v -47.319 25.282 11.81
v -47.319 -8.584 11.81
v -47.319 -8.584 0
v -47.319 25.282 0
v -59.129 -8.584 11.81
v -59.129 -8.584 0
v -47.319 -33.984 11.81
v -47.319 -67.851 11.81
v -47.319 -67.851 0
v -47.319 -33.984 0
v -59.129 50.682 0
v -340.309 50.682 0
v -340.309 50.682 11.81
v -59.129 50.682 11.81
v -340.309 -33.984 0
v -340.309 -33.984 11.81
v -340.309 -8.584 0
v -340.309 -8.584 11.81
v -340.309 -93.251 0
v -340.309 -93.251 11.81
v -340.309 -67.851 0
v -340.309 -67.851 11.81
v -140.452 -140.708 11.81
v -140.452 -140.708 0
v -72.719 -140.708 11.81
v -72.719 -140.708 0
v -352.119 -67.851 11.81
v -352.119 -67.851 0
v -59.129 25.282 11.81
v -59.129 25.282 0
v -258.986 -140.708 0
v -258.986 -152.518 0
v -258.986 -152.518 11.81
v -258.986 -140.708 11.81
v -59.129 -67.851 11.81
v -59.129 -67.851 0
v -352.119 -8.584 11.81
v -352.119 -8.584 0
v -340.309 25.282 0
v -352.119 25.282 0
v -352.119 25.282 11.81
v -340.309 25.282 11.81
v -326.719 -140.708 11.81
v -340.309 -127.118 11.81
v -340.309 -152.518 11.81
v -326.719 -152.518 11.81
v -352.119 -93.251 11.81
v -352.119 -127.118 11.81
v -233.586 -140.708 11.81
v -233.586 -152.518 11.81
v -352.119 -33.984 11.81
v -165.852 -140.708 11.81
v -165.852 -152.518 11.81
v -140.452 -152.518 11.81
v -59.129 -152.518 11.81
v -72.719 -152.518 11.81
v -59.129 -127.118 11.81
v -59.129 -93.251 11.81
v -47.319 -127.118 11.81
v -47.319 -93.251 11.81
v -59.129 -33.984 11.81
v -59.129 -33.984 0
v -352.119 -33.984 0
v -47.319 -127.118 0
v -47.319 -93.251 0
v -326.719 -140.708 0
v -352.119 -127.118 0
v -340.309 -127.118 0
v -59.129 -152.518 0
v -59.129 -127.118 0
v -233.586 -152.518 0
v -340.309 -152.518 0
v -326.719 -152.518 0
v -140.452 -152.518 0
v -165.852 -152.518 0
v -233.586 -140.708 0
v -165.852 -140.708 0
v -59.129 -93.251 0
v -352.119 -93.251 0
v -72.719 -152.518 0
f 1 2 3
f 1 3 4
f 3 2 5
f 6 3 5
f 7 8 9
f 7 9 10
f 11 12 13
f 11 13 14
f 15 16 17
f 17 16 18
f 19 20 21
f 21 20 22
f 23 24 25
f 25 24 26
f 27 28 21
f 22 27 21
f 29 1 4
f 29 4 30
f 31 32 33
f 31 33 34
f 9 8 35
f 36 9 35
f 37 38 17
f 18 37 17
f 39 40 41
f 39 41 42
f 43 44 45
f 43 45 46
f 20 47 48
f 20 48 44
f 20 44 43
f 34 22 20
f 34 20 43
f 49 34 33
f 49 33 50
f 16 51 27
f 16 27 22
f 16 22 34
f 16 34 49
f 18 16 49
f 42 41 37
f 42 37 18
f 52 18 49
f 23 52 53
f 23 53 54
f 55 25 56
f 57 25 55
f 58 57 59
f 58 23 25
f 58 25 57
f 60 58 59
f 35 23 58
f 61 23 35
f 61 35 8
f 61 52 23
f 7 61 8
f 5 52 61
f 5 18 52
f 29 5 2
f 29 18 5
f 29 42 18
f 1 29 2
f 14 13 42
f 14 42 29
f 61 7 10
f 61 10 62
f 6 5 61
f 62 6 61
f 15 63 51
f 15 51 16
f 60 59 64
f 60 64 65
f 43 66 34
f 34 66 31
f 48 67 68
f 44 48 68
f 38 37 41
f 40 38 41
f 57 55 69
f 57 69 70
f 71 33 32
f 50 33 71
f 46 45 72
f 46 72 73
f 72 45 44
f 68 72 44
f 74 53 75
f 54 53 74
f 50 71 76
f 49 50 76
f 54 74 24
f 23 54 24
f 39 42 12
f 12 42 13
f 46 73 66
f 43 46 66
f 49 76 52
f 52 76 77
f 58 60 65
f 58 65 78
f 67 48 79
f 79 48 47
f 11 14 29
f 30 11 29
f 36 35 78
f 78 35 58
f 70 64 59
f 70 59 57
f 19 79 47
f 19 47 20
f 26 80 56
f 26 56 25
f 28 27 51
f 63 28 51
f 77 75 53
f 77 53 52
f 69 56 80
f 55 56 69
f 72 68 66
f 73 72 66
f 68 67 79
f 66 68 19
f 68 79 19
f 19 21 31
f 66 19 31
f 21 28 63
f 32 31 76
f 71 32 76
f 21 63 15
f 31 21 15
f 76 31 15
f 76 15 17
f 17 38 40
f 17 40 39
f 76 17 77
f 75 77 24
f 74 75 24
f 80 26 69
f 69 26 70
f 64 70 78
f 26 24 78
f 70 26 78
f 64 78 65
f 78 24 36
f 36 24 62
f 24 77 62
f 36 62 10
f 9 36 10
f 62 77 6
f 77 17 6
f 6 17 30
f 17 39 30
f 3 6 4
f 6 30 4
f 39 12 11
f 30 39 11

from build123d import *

# Parameters (mm, degrees)
BASE_SKETCH_W           = 304.8
BASE_SKETCH_H           = 191.39
BOSS_EXTRUDE1_DEPTH     = 11.81
JOINT_X_W               = 25.4
JOINT_X_H               = 11.81
BOSS_EXTRUDE2_DEPTH     = 11.81
JOINT_Y_W               = 11.81
JOINT_Y_H               = 25.4
CUT_EXTRUDE1_DEPTH      = 384.912686042
LPATTERN1_COUNT         = 4
LPATTERN1_PITCH         = 93.133333333
LPATTERN2_COUNT         = 4
LPATTERN2_PITCH         = 59.266666667
MIRROR1_COPY_1_SKETCH_W = 11.81
MIRROR1_COPY_1_SKETCH_H = 25.4
MIRROR1_COPY_1_DEPTH    = 384.912686042
MIRROR1_COPY_2_SKETCH_W = 11.81
MIRROR1_COPY_2_SKETCH_H = 25.4
MIRROR1_COPY_2_DEPTH    = 384.912686042
MIRROR1_COPY_3_SKETCH_W = 11.81
MIRROR1_COPY_3_SKETCH_H = 25.4
MIRROR1_COPY_3_DEPTH    = 384.912686042


with BuildPart() as part:
    # Base_Sketch → Boss-Extrude1 (new body)
    with BuildSketch(Plane.XY):
        with Locations((-199.719002607, -45.012810132)):
            Rectangle(BASE_SKETCH_W, BASE_SKETCH_H)
    extrude(amount=BOSS_EXTRUDE1_DEPTH)

    # Joint_X → Boss-Extrude2 (add)
    with BuildSketch(Plane.XY.offset(11.81)):
        with Locations((-339.419002607, -146.612810132)):
            Rectangle(JOINT_X_W, JOINT_X_H)
    boss_extrude2 = extrude(amount=-BOSS_EXTRUDE2_DEPTH)

    # Joint_Y → Cut-Extrude1 (cut, through all)
    with BuildSketch(Plane.XY.offset(11.81)):
        with Locations((-346.214002607, -139.817810132)):
            Rectangle(JOINT_Y_W, JOINT_Y_H)
    cut_extrude1 = extrude(amount=-CUT_EXTRUDE1_DEPTH, mode=Mode.SUBTRACT)

    # LPattern1: Boss-Extrude2 ×4
    with Locations(*[(i * LPATTERN1_PITCH, 0, 0) for i in range(1, LPATTERN1_COUNT)]):
        add(boss_extrude2)

    # LPattern2: Cut-Extrude1 ×4
    with Locations(*[(0, i * LPATTERN2_PITCH, 0) for i in range(1, LPATTERN2_COUNT)]):
        add(cut_extrude1, mode=Mode.SUBTRACT)

    # Mirror1: Cut-Extrude1 across plane
    add(cut_extrude1.mirror(Plane.ZY.offset(199.719002607)), mode=Mode.SUBTRACT)

    # Mirror1 copy 1 sketch → Mirror1 copy 1 (cut, through all)
    with BuildSketch(Plane(origin=(-399.438005213, 59.266666667, 11.81), x_dir=(-1, 0, 0), z_dir=(0, 0, 1))):
        with Locations((-346.214002607, 139.817810132)):
            Rectangle(MIRROR1_COPY_1_SKETCH_W, MIRROR1_COPY_1_SKETCH_H)
    extrude(amount=-MIRROR1_COPY_1_DEPTH, mode=Mode.SUBTRACT)

    # Mirror1 copy 2 sketch → Mirror1 copy 2 (cut, through all)
    with BuildSketch(Plane(origin=(-399.438005213, 118.533333333, 11.81), x_dir=(-1, 0, 0), z_dir=(0, 0, 1))):
        with Locations((-346.214002607, 139.817810132)):
            Rectangle(MIRROR1_COPY_2_SKETCH_W, MIRROR1_COPY_2_SKETCH_H)
    extrude(amount=-MIRROR1_COPY_2_DEPTH, mode=Mode.SUBTRACT)

    # Mirror1 copy 3 sketch → Mirror1 copy 3 (cut, through all)
    with BuildSketch(Plane(origin=(-399.438005213, 177.8, 11.81), x_dir=(-1, 0, 0), z_dir=(0, 0, 1))):
        with Locations((-346.214002607, 139.817810132)):
            Rectangle(MIRROR1_COPY_3_SKETCH_W, MIRROR1_COPY_3_SKETCH_H)
    extrude(amount=-MIRROR1_COPY_3_DEPTH, mode=Mode.SUBTRACT)


solid = part.part
